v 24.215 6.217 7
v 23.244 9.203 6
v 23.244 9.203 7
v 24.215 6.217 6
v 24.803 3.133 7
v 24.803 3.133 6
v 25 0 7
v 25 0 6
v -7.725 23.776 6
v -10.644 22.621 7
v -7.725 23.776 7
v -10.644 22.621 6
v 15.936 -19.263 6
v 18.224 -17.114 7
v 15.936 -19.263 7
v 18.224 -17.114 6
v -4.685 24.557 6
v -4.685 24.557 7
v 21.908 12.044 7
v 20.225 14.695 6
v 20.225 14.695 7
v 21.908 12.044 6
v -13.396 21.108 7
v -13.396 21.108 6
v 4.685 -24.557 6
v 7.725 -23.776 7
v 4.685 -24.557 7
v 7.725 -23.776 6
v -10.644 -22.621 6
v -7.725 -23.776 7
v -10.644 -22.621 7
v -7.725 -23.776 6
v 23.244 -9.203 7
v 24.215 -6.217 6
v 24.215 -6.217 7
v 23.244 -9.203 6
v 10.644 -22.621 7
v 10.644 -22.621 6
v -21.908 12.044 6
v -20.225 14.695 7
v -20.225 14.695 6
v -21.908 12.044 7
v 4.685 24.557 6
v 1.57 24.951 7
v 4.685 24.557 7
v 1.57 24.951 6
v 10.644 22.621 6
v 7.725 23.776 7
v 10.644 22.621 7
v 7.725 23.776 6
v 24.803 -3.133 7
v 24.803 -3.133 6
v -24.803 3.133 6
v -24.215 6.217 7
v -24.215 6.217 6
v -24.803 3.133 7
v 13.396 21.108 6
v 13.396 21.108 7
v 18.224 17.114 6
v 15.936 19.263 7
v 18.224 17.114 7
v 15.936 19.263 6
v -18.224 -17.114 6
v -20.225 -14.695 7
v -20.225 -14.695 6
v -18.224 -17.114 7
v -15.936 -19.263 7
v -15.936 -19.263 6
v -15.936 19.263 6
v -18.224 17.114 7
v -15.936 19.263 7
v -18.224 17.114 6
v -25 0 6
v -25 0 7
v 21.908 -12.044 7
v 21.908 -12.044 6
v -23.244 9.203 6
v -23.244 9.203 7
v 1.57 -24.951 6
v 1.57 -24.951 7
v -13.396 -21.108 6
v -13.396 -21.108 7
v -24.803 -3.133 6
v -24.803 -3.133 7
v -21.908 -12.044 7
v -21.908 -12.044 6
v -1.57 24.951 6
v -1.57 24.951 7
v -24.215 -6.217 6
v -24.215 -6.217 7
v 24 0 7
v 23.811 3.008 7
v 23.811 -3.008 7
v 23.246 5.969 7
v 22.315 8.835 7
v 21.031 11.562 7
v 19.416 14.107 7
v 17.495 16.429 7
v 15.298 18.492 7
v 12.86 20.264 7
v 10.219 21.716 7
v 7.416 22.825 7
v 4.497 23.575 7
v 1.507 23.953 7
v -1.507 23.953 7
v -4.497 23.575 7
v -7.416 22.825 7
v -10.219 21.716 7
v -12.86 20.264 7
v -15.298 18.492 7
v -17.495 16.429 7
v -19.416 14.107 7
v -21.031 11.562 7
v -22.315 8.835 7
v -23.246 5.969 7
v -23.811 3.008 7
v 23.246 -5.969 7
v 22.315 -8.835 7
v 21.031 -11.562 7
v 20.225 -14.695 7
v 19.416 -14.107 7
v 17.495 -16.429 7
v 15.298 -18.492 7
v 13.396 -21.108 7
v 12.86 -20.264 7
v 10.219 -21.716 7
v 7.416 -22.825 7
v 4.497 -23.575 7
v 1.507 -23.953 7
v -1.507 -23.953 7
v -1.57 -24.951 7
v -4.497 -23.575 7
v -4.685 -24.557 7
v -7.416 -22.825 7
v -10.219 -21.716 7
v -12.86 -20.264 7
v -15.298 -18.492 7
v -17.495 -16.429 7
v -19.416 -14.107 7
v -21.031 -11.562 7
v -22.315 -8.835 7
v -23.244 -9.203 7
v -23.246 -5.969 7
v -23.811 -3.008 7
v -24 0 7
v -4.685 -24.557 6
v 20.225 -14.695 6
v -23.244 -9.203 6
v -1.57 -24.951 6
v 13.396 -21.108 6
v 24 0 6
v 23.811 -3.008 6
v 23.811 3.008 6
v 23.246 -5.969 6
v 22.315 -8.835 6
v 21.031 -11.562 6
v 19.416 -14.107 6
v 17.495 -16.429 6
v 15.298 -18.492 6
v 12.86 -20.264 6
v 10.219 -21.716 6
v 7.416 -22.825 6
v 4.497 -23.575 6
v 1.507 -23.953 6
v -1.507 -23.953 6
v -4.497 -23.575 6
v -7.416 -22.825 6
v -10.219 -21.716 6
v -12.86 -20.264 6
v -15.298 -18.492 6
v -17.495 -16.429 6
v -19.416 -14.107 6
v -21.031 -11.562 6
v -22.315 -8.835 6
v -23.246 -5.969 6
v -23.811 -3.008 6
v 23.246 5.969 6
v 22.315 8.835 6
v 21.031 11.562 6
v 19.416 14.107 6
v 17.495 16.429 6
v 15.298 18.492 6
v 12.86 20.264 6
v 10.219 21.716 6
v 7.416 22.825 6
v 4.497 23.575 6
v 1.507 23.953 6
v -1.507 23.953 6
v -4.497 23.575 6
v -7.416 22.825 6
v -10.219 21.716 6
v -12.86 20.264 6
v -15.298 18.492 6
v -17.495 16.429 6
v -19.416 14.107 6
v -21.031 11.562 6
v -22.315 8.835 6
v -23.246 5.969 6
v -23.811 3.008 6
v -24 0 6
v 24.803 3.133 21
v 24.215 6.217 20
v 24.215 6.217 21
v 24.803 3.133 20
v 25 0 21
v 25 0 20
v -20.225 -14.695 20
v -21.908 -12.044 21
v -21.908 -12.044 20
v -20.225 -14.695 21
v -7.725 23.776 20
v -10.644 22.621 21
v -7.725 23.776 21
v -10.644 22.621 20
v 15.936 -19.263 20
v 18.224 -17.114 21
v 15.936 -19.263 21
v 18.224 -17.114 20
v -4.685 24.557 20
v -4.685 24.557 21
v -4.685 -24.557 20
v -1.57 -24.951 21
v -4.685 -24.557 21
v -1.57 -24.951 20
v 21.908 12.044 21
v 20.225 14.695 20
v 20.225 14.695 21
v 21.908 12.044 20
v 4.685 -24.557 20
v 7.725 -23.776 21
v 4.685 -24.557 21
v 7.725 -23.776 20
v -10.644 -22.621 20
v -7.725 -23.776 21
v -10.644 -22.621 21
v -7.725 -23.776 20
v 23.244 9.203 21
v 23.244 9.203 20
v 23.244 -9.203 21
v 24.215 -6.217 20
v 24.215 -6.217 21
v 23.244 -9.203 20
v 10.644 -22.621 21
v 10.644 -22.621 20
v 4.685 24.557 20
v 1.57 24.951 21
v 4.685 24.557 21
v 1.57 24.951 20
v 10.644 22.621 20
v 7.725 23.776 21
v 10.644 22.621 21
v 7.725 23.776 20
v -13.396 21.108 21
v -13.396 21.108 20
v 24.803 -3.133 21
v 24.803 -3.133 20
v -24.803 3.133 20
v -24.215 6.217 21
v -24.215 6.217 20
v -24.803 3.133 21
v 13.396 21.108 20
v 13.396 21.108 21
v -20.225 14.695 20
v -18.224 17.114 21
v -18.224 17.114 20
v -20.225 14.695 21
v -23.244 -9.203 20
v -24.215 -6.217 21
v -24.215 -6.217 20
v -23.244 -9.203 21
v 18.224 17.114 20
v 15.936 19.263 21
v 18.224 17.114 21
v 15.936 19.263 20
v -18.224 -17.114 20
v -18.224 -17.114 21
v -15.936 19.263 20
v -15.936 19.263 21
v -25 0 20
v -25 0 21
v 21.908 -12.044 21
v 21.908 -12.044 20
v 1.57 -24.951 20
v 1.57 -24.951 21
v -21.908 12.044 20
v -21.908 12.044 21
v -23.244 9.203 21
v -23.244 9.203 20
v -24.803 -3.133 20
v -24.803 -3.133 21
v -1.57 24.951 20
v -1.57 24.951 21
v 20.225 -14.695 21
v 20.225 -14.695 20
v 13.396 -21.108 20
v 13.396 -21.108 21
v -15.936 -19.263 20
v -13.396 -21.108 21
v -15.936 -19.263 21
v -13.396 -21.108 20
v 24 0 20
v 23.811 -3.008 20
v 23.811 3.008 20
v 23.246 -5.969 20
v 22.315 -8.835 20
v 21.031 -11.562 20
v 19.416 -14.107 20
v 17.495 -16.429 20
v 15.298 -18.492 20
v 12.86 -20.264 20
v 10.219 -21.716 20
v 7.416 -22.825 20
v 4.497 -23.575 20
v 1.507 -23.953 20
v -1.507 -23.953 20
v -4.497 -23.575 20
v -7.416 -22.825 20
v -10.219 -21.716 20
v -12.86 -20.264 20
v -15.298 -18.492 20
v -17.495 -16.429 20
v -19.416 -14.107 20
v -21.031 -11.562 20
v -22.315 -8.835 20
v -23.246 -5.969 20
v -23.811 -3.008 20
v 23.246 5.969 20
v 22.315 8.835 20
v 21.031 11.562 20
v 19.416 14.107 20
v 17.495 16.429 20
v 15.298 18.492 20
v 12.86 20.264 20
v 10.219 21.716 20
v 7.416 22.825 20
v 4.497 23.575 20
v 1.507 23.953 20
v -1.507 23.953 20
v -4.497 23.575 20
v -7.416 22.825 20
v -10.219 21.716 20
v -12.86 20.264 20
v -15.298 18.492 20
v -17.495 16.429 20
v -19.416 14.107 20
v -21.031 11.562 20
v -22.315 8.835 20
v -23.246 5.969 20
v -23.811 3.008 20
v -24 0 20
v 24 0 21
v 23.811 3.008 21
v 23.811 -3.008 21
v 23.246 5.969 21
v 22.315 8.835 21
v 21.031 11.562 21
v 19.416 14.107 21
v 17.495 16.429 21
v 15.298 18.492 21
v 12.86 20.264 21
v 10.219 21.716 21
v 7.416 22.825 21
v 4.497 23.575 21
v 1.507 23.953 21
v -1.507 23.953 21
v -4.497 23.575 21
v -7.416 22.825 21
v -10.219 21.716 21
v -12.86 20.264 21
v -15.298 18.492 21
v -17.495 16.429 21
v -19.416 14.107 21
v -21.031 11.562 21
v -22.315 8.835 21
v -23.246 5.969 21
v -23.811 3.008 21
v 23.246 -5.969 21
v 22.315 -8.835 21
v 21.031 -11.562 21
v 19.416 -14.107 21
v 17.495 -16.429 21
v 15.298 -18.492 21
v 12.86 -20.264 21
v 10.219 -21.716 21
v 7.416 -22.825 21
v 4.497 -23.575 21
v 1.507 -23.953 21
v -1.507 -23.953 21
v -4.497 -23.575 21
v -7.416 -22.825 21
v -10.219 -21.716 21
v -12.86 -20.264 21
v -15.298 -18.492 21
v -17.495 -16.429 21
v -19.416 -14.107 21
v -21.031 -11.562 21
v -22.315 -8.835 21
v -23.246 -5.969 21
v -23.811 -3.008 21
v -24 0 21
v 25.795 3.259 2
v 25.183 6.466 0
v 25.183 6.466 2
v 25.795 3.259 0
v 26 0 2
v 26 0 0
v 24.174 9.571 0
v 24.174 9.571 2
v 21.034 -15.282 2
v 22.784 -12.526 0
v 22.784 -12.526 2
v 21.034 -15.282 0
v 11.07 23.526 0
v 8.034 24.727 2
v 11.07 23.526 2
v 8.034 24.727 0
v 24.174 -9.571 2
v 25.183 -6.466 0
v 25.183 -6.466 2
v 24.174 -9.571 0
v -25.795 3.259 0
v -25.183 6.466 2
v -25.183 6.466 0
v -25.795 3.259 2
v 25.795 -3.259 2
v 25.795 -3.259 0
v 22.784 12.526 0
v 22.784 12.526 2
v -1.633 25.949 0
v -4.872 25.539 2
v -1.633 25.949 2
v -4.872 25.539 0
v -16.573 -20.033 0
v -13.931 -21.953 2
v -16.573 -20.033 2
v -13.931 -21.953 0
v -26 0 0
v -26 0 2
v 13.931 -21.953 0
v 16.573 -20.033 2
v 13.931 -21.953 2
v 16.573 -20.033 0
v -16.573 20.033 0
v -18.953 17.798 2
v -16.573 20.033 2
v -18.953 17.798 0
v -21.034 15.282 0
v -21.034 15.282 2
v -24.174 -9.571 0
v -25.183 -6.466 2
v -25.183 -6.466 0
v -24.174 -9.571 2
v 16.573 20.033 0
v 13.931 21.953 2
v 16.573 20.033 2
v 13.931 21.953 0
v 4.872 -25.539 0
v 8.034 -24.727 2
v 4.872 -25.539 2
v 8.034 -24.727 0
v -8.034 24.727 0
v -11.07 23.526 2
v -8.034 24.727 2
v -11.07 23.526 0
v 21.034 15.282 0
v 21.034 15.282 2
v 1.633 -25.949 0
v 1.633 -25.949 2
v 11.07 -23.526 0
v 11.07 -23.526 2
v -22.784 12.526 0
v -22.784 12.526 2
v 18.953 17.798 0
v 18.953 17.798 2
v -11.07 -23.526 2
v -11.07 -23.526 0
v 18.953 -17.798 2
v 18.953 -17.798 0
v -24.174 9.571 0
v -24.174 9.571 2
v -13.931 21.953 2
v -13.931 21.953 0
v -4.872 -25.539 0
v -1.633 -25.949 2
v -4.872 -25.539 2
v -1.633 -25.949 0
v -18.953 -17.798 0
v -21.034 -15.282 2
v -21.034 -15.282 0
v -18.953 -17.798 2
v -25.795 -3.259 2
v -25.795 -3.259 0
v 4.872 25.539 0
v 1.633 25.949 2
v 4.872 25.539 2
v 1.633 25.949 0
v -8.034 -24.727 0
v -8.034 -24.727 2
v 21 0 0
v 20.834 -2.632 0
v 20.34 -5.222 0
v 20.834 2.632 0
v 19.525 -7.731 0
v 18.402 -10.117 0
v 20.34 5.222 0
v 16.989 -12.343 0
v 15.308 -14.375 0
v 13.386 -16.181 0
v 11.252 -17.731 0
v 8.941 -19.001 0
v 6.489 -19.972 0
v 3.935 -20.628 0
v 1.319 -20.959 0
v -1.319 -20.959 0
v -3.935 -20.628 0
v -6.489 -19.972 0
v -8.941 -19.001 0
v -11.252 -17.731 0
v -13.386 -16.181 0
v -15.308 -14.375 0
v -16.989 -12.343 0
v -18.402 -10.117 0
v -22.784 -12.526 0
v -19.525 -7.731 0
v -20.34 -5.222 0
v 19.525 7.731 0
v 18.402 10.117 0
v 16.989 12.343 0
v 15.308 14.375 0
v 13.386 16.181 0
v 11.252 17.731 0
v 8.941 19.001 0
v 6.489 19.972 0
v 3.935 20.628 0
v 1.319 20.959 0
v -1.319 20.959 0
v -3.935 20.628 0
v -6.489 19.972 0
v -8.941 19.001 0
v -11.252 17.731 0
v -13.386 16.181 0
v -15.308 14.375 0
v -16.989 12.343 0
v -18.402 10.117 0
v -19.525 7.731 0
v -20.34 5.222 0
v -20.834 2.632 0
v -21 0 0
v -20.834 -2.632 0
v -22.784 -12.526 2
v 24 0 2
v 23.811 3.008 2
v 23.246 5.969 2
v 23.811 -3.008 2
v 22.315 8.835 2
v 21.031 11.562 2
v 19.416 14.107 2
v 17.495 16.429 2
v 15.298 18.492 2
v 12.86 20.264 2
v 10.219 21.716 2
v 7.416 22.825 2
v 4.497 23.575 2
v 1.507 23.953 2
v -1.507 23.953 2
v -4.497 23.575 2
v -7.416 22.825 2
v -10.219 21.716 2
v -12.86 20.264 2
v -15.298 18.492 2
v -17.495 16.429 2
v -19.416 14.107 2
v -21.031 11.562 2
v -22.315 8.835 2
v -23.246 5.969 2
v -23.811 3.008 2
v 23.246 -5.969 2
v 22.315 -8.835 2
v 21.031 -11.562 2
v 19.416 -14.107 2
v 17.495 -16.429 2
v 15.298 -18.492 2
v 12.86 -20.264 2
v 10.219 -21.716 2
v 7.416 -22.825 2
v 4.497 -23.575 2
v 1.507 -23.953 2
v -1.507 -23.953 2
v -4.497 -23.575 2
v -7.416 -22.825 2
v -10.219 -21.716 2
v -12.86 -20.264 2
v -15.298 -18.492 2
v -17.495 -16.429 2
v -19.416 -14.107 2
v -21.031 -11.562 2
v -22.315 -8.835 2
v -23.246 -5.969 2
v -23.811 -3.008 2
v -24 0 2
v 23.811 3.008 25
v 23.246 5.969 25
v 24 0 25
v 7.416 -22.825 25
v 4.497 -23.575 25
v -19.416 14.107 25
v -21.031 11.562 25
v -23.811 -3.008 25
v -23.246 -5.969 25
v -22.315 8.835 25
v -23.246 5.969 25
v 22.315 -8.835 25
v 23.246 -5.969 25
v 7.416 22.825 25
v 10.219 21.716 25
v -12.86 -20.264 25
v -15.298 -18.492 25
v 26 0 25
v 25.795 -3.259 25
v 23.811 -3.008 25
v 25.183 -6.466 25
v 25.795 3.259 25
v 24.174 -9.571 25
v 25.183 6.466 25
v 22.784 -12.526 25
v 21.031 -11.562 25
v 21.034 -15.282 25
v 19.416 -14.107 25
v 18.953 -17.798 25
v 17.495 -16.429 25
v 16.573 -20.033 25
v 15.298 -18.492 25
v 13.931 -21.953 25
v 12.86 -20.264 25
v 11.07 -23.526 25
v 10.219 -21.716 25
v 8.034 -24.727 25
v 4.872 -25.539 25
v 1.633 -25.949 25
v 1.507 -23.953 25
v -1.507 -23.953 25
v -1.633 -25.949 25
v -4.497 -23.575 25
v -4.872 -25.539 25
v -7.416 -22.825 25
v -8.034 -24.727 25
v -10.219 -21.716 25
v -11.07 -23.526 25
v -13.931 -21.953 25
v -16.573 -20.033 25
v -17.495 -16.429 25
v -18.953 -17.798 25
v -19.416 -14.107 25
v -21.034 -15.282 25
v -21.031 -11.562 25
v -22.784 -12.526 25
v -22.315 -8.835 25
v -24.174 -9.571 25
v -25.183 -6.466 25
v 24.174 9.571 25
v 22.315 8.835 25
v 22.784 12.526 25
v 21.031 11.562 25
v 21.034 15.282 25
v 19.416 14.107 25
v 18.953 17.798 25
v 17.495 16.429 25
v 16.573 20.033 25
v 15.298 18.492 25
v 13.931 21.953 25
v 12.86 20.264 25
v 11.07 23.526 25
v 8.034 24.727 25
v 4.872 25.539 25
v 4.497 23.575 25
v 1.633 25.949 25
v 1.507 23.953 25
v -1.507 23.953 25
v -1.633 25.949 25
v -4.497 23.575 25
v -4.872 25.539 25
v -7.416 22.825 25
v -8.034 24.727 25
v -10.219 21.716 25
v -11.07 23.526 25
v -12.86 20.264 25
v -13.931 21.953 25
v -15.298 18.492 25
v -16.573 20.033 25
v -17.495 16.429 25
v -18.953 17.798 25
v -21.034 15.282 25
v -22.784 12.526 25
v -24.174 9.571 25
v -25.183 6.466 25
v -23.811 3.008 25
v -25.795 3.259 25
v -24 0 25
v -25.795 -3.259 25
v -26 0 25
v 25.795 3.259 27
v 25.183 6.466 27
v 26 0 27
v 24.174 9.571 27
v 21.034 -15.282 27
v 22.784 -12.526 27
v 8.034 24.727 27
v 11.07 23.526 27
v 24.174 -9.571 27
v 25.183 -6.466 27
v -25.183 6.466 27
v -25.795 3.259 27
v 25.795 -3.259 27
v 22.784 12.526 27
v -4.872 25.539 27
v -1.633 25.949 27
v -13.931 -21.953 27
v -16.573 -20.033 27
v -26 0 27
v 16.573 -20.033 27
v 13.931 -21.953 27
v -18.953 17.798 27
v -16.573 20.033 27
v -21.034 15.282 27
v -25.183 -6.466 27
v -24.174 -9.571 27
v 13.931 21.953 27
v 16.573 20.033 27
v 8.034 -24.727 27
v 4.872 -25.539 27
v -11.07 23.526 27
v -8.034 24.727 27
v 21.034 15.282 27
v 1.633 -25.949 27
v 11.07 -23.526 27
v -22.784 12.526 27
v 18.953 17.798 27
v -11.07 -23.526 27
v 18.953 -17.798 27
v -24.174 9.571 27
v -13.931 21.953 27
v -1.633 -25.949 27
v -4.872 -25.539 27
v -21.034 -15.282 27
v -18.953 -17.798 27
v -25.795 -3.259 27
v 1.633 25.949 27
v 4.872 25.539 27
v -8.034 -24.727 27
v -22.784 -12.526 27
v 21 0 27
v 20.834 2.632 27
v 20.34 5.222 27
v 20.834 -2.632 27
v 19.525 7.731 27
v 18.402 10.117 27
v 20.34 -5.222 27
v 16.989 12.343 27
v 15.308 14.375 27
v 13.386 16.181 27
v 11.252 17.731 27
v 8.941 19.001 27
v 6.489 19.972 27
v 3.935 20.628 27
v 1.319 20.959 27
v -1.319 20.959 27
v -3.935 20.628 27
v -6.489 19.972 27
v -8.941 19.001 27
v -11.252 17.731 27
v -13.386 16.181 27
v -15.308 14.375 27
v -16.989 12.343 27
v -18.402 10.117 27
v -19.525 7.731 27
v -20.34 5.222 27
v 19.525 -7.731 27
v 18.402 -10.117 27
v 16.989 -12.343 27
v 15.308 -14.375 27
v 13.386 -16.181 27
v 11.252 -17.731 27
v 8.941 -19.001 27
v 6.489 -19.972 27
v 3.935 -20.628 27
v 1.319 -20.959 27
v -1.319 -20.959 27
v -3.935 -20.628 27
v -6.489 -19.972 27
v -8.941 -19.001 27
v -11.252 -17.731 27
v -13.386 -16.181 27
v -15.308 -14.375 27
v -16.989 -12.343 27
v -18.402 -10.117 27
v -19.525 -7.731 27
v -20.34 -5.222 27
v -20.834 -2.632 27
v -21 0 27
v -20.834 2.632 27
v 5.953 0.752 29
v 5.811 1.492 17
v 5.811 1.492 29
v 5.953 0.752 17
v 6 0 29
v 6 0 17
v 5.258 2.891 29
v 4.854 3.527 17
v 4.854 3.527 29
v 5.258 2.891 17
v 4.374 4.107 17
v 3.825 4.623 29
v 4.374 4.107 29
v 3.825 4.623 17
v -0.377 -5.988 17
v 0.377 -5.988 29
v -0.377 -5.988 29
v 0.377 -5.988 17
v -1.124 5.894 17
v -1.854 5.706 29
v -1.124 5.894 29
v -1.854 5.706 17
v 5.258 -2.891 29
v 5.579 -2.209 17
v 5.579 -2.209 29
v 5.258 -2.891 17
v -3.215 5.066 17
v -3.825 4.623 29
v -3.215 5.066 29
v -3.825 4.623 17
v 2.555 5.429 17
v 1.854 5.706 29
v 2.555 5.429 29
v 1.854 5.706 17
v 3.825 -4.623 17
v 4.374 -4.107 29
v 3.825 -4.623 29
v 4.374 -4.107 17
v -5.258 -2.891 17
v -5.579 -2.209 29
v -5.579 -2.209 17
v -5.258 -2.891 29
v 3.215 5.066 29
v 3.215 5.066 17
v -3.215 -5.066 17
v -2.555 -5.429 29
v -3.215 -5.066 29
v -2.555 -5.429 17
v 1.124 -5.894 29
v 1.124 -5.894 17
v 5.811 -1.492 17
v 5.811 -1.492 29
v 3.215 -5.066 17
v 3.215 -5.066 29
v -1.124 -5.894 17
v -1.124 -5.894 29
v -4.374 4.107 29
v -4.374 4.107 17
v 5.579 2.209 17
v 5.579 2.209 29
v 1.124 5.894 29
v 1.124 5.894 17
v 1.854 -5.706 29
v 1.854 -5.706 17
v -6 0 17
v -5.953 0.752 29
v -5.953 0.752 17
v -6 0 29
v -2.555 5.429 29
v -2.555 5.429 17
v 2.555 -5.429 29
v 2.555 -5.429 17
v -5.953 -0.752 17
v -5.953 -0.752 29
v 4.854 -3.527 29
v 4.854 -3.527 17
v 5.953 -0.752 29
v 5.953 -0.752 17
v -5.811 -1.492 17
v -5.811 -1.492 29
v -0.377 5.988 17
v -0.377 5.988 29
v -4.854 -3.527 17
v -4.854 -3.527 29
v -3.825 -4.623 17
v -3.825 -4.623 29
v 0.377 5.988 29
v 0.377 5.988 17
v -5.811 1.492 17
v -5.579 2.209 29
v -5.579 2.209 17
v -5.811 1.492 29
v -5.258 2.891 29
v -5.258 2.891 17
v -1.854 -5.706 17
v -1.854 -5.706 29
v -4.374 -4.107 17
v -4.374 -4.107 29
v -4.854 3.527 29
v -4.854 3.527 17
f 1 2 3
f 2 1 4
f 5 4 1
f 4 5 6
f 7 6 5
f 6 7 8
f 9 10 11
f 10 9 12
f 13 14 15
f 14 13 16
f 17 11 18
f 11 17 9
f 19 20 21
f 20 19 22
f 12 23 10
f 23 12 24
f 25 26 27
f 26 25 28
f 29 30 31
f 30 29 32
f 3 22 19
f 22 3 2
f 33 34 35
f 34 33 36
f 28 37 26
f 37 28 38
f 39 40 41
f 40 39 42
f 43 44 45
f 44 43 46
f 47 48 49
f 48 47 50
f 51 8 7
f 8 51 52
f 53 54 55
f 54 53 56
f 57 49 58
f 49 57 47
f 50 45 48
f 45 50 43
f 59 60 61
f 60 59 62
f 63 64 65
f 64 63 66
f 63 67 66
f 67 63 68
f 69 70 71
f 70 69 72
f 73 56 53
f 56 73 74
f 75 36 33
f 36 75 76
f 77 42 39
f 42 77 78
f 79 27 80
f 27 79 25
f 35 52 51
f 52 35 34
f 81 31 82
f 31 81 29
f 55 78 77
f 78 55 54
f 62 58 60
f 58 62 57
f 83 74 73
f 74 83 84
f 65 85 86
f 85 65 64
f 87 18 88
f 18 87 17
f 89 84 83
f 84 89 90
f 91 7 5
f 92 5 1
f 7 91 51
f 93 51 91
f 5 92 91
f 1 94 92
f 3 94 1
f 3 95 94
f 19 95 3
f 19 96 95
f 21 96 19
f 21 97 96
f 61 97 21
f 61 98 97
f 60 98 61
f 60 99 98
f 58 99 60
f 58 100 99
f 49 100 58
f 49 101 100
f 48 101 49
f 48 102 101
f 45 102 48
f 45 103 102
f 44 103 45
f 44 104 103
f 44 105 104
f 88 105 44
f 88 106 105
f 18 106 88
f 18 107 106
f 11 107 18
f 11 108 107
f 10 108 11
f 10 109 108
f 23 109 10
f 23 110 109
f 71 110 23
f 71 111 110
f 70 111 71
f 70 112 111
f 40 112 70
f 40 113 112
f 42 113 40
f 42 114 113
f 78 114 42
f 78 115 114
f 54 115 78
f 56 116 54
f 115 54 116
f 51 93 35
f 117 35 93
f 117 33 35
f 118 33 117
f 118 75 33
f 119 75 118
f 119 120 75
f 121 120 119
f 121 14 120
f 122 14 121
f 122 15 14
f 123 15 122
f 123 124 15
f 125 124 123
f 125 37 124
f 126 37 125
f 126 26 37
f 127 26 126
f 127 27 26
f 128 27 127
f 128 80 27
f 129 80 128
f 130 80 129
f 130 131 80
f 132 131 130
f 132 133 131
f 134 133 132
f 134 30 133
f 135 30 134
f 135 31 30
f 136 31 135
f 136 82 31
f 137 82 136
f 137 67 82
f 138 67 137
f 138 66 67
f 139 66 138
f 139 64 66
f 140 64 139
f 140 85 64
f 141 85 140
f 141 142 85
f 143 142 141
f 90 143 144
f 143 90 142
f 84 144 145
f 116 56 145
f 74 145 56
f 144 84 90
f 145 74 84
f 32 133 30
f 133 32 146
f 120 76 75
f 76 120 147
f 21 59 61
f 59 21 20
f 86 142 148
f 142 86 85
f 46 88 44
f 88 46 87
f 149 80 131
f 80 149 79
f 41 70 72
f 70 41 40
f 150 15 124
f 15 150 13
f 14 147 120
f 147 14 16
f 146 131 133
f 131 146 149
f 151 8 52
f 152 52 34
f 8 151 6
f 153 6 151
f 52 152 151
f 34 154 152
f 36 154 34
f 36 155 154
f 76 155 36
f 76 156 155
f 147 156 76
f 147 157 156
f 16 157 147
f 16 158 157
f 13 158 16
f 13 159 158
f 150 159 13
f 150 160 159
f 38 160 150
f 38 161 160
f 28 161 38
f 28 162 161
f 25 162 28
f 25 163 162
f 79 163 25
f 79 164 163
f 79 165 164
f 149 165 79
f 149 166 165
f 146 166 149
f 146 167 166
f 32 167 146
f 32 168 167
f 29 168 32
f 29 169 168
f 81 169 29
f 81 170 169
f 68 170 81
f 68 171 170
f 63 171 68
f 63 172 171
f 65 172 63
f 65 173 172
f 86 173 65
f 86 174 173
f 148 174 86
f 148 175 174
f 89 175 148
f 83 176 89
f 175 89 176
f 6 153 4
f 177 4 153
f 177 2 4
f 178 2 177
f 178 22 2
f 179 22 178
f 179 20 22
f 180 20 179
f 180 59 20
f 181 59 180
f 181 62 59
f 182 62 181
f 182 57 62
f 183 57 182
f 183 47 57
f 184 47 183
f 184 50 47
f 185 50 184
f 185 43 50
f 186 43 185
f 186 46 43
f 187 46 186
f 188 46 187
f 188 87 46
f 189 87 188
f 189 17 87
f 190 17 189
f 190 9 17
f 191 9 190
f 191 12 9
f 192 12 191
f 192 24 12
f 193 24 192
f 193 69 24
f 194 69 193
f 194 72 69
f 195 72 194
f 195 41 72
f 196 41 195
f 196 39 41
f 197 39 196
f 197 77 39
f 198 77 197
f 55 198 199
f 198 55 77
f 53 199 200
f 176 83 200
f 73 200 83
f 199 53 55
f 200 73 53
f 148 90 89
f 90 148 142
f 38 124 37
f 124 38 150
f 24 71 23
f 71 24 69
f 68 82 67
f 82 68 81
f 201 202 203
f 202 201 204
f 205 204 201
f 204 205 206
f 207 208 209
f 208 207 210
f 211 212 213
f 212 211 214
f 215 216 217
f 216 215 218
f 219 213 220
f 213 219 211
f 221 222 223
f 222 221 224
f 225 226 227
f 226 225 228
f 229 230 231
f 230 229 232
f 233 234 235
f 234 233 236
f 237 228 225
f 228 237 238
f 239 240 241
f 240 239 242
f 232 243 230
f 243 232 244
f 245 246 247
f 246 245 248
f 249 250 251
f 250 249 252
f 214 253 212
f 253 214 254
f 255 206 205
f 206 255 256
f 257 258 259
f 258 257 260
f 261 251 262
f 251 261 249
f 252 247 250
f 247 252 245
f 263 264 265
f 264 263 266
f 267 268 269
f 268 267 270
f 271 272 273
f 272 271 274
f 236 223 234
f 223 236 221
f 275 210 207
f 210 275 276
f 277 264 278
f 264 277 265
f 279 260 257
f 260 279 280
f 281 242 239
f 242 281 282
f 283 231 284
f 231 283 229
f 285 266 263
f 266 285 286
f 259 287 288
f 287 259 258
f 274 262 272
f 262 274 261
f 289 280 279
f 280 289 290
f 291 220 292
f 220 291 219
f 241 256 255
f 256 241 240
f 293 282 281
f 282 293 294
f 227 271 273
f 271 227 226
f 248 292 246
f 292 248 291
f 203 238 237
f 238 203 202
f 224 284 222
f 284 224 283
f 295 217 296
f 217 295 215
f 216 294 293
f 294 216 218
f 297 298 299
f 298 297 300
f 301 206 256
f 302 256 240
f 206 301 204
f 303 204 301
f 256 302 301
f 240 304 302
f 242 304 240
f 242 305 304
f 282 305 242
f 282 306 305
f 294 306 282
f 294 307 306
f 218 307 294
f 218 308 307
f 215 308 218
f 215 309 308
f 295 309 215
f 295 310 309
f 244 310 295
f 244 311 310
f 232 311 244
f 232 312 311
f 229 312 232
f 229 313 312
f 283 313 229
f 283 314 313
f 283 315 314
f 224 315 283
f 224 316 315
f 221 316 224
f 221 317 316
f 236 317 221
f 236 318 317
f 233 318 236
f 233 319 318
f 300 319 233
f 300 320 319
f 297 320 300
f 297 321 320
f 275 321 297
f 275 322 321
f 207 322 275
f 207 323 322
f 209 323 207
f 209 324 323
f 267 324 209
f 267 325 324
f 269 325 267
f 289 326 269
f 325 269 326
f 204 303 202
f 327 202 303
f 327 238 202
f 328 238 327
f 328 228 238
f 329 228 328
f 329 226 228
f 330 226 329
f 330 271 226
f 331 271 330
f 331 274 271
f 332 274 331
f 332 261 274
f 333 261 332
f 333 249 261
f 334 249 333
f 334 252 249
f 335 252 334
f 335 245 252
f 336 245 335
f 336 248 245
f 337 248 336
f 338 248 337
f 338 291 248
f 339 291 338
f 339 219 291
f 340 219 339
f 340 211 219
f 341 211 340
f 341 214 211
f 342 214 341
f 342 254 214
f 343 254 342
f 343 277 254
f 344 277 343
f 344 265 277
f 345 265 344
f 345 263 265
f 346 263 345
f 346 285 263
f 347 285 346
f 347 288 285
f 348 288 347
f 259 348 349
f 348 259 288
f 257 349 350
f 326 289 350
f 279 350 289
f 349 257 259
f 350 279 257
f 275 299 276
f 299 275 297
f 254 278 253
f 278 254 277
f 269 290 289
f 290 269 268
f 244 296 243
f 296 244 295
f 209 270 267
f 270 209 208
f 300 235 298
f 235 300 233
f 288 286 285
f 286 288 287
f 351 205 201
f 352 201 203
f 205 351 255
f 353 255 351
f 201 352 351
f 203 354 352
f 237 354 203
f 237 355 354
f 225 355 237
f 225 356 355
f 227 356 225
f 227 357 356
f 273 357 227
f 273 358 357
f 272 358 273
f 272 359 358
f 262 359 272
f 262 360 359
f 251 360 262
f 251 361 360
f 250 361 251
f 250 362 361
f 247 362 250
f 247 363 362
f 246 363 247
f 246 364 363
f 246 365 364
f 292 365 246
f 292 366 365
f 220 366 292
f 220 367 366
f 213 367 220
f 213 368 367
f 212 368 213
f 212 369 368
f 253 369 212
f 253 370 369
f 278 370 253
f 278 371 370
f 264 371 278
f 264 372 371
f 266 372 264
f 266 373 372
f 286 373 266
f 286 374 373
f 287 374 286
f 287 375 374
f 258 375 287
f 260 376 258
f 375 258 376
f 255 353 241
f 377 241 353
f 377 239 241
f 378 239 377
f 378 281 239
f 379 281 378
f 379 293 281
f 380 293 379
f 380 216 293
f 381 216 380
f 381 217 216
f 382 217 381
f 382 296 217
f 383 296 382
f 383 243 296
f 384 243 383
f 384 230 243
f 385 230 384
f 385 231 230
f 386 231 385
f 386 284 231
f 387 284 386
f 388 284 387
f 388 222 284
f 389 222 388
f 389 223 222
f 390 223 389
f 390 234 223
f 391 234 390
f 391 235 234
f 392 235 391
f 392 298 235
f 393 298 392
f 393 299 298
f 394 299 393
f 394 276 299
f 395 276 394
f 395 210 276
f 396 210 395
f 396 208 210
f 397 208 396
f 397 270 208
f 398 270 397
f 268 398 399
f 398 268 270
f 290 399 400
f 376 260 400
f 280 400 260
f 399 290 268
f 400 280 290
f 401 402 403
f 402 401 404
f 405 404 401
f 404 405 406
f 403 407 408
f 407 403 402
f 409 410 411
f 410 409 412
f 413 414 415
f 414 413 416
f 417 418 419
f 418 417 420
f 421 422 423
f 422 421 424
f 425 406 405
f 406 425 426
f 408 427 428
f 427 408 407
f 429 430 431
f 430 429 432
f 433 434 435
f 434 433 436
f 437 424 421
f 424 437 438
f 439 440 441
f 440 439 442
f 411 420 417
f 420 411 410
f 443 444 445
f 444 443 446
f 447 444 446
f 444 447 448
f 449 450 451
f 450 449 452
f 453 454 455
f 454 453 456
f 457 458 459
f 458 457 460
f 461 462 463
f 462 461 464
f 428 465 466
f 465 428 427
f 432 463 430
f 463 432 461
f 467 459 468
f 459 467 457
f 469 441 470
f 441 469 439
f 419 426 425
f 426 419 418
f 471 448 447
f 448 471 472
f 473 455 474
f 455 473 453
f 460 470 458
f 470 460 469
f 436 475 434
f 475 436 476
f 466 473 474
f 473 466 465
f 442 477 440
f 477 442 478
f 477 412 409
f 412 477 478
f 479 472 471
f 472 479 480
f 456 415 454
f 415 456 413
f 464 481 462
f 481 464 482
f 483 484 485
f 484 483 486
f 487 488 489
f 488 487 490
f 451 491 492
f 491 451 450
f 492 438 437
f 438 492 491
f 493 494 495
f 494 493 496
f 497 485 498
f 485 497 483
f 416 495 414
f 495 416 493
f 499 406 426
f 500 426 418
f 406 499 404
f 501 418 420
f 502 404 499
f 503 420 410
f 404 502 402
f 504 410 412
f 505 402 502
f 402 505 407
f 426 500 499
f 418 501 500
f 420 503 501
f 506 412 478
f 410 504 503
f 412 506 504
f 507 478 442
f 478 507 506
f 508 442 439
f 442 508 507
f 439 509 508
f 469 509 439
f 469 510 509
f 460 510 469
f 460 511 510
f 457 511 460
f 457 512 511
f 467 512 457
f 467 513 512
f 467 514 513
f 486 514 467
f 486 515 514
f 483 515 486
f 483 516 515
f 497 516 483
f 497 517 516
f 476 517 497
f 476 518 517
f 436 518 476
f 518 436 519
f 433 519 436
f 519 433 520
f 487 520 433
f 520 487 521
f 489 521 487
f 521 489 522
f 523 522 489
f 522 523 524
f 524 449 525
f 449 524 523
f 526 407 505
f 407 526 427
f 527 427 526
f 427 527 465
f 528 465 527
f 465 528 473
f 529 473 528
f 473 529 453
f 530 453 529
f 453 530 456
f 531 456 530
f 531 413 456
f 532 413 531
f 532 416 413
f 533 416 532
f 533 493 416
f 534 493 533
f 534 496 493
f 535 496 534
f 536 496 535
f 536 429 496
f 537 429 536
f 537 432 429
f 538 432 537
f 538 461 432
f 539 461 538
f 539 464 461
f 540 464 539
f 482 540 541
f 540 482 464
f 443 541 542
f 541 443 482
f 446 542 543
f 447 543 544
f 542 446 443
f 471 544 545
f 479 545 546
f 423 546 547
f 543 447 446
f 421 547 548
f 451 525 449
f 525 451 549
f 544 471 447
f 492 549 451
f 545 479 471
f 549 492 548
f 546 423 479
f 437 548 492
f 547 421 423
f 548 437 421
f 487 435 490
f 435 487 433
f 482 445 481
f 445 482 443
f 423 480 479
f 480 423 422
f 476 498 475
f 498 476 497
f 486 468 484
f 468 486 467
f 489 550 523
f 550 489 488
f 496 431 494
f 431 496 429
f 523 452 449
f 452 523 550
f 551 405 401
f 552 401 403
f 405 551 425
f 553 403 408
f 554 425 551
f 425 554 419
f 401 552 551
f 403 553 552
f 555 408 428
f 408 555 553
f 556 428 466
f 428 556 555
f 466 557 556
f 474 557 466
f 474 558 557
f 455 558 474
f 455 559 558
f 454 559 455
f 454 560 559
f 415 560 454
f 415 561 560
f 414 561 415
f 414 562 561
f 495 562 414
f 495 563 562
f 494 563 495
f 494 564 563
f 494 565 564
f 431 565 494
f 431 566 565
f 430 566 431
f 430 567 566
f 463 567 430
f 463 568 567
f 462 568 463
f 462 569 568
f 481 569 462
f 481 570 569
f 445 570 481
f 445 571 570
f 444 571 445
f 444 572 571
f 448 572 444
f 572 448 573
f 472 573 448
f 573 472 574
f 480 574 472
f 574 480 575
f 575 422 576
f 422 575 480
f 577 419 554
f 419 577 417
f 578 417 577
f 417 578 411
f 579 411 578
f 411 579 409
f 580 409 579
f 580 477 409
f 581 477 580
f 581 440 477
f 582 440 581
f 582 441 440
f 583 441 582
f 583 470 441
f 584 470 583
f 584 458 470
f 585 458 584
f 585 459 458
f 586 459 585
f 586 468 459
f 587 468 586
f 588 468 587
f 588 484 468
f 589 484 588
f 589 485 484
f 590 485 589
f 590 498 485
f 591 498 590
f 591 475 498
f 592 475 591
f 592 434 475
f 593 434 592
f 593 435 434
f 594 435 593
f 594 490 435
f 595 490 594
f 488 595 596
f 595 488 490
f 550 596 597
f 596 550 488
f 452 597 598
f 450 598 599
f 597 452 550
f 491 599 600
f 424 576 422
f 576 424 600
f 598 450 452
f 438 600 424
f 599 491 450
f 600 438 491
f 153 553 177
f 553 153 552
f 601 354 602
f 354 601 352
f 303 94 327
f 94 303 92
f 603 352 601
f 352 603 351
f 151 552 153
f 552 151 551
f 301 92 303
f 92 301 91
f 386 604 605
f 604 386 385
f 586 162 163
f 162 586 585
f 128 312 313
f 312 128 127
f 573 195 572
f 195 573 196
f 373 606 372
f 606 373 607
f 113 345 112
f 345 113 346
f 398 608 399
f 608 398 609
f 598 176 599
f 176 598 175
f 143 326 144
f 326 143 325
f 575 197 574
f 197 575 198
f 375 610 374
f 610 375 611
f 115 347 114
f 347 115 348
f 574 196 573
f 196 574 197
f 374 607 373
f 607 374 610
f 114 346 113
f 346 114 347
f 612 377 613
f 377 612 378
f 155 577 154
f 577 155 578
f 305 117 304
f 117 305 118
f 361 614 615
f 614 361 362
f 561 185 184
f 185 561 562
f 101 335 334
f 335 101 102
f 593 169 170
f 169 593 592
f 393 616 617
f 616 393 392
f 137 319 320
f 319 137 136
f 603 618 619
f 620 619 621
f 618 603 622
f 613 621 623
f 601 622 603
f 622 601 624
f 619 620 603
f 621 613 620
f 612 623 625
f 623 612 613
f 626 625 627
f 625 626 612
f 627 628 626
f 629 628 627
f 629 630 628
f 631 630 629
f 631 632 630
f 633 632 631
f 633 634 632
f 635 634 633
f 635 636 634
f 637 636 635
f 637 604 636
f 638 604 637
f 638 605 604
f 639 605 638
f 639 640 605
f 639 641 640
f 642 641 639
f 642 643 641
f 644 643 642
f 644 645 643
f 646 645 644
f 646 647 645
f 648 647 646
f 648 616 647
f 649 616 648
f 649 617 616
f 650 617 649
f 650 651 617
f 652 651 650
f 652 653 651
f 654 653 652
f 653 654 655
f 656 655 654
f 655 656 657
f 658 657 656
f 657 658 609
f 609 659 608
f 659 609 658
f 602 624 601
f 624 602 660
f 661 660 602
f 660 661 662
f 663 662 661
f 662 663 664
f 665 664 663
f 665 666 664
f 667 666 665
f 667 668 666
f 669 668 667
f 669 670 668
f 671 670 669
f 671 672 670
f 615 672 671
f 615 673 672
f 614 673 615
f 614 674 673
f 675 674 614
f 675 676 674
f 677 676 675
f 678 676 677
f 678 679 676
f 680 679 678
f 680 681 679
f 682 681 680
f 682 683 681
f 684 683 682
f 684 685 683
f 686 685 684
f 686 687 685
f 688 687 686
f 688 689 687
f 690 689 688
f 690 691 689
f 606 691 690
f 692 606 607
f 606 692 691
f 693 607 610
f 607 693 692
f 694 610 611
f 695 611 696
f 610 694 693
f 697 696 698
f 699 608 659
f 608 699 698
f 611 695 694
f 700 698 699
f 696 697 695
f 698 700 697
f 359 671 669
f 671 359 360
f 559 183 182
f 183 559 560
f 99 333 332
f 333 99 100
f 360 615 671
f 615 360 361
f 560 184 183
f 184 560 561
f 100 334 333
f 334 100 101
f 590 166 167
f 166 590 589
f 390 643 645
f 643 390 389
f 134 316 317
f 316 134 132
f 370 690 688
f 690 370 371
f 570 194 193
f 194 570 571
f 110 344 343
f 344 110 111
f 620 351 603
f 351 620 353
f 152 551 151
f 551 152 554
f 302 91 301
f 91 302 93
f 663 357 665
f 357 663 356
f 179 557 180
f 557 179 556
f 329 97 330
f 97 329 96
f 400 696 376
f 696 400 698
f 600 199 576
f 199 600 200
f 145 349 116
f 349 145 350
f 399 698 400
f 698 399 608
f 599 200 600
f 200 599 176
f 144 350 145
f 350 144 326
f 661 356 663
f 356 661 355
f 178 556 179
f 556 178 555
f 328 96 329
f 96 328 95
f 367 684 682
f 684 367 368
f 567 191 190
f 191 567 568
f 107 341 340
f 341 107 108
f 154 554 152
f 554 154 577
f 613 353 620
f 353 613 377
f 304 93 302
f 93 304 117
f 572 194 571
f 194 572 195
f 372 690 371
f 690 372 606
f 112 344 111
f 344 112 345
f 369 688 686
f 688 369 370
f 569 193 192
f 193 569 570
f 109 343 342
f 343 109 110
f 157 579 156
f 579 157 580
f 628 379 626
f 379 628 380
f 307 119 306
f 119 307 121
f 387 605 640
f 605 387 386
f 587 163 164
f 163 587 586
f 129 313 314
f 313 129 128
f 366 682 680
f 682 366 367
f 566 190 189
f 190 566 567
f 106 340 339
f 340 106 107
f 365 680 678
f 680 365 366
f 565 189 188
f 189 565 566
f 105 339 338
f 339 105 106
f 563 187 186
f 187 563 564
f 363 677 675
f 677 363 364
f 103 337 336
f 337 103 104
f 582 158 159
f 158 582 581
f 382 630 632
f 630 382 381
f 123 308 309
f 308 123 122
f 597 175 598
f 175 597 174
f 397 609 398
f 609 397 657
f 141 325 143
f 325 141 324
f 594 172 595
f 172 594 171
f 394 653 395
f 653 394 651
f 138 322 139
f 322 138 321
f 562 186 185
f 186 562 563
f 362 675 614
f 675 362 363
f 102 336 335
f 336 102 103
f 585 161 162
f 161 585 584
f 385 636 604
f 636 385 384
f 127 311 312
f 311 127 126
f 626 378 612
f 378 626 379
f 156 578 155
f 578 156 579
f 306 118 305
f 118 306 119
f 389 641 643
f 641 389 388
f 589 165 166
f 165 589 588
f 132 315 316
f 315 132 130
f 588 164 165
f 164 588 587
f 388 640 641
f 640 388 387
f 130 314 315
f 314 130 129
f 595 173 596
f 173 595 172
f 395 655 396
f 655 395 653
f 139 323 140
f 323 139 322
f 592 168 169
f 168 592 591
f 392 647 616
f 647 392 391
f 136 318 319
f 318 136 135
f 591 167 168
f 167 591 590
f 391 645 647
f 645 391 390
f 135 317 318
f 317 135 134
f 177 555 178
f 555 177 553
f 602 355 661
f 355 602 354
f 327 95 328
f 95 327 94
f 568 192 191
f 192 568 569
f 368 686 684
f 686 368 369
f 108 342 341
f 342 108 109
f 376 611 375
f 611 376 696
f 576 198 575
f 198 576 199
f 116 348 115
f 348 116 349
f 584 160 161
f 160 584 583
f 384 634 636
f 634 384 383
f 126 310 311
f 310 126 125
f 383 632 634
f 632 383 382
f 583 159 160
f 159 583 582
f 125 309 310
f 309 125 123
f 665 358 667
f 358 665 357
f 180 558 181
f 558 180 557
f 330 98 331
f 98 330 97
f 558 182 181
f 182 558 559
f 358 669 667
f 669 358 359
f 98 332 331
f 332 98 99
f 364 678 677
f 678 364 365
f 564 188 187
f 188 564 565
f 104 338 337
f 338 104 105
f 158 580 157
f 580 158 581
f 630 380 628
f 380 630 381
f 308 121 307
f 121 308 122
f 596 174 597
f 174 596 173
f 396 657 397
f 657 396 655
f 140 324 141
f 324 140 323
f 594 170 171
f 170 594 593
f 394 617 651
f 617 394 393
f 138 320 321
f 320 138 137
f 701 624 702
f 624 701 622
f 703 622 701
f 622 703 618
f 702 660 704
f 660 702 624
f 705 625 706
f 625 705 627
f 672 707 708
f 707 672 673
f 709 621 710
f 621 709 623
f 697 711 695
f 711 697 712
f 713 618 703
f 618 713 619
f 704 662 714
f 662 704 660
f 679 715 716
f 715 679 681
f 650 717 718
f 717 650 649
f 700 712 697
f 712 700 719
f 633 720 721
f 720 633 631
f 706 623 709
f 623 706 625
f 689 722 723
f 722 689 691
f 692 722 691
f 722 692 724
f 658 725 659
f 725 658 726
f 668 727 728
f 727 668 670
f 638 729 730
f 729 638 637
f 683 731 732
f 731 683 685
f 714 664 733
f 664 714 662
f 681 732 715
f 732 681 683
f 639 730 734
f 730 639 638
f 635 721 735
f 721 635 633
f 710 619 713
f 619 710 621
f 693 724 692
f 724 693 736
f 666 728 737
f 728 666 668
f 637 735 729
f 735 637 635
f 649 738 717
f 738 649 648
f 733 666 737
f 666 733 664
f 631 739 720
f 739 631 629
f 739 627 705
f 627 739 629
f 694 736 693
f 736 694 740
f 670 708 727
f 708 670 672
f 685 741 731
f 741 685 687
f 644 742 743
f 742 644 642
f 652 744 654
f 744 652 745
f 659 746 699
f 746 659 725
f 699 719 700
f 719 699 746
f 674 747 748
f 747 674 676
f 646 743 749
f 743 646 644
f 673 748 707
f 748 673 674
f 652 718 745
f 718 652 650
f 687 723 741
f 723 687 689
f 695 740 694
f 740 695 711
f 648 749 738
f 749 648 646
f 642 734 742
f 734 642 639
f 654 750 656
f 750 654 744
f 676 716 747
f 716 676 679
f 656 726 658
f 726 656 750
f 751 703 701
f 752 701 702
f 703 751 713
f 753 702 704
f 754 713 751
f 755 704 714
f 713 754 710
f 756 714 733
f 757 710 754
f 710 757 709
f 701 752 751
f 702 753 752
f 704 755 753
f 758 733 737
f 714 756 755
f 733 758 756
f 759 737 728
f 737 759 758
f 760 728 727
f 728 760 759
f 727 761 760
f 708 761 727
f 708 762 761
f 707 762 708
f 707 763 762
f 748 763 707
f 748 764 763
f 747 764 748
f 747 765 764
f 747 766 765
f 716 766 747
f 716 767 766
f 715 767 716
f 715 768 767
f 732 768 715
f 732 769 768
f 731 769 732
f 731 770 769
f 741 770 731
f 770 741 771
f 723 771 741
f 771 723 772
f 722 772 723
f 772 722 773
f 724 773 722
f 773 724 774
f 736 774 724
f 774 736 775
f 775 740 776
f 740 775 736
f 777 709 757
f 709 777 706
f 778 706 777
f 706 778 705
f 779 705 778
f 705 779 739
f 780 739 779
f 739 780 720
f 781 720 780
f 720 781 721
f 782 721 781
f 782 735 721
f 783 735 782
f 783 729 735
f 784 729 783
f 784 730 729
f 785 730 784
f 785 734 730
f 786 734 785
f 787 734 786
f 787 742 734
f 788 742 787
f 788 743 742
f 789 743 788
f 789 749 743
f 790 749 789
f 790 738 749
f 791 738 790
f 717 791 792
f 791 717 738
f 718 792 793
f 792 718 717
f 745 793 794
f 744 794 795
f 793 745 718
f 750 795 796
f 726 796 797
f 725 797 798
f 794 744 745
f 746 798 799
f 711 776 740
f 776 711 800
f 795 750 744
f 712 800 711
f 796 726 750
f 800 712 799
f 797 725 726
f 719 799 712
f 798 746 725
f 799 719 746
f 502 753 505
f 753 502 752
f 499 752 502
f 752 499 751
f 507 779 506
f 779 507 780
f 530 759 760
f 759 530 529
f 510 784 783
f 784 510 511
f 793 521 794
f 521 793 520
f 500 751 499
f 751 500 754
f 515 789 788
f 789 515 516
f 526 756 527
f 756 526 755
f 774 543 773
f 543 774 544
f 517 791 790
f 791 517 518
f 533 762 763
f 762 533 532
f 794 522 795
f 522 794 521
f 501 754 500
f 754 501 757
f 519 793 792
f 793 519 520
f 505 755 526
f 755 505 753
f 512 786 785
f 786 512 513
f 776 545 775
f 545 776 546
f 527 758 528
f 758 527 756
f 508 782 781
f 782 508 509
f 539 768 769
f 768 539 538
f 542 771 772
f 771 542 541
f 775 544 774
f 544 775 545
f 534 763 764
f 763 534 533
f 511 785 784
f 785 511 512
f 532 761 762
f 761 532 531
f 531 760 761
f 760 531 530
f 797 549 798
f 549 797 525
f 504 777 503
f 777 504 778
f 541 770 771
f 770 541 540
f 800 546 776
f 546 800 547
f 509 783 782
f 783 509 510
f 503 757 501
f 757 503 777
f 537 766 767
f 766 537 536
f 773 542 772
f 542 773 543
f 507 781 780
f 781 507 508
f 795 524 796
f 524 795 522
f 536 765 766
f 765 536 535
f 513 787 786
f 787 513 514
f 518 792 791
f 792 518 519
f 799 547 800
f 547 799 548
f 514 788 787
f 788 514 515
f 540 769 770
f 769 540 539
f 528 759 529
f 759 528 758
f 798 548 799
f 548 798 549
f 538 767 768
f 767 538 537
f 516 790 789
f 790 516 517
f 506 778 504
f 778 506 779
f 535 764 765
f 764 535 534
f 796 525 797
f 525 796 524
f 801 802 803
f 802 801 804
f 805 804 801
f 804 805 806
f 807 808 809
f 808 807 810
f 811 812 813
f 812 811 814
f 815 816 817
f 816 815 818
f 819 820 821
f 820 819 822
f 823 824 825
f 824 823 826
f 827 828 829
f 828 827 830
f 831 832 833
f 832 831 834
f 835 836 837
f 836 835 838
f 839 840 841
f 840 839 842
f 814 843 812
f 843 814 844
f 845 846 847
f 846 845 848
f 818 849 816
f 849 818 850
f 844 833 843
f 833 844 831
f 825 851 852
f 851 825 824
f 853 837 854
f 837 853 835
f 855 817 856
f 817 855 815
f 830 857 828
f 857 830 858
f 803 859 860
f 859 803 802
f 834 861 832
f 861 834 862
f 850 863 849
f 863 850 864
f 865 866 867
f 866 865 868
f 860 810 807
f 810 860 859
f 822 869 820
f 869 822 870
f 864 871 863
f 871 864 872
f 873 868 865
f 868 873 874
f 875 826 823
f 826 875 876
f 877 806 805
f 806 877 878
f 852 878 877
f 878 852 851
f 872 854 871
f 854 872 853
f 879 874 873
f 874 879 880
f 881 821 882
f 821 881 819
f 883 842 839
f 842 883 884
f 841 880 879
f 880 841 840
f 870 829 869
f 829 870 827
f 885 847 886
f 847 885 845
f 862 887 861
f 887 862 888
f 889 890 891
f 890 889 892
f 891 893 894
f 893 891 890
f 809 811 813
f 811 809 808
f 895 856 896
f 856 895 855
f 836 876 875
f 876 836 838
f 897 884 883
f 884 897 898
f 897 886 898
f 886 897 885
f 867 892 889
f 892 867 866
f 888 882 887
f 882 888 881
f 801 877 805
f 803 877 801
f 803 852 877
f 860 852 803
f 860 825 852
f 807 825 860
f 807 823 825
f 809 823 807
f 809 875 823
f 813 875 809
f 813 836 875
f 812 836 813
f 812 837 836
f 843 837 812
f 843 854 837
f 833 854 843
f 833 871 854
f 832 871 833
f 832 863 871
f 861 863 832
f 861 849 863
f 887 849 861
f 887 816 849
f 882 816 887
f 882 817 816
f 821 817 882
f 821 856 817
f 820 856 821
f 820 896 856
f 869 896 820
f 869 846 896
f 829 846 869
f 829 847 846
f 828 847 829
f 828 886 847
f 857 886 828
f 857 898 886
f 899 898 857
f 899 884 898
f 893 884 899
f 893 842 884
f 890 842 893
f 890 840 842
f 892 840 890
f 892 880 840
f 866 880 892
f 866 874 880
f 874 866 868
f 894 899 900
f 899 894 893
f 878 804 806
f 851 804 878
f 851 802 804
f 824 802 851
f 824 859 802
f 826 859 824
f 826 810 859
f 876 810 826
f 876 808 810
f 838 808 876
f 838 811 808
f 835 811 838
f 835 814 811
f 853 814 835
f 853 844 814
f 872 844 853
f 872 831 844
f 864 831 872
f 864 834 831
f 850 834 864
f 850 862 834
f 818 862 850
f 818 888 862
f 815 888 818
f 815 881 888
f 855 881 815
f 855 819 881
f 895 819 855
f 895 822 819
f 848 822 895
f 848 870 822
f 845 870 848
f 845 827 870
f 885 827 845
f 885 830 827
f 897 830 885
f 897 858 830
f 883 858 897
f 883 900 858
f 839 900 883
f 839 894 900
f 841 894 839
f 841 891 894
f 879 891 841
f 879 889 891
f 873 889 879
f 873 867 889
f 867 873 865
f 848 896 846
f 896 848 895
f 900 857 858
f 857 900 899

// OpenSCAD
// DP parametric wheel
// May 2019. David Price
//
// parametric wheel for a polebot
// initial design is to fit gearmotor tyres
//
// v0.2,  190704 added tyre retention ribs
// v0.1,  190611 initial design to test fit with tyres
//
// wheel parameters
diameter = 48;
width = 27;
thick = 3;
rim_high = 2;
rim_wide = 2;

// hub parameters
hub_inset = 10;
hub_height = 12;
hub_diameter = 12;
// tyre retention rib, offset from rim if greater than 0
rib_offset = 4;
rib_high = 1;
rib_wide = 1;

// derivations to make code simpler
$fn = 50;
dv_wheel_radius = diameter/2;
dv_rim_radius = dv_wheel_radius + rim_high;
dv_inside_radius = dv_wheel_radius - thick;

dv_hub_radius = hub_diameter/2;

dv_rib_radius = dv_wheel_radius + rib_high;

module wheel()
{
 difference() {
    union() {
        cylinder(r=dv_rim_radius, h=rim_wide);
        translate([0,0,rim_wide])
        cylinder(r=dv_wheel_radius, h=width-(rim_wide*2));
        translate([0,0,(width-rim_wide)])
        cylinder(r=dv_rim_radius, h=rim_wide);
        
        rib();

        }
    
    cylinder(r=dv_wheel_radius - thick, h=width);
    }
}

module rib() {
// if greater than zero add two ribs on the wheel to retain the tyre

if (rib_offset>0)
    {
        echo("rib offset is ", rib_offset);
 
        translate([0,0,rib_offset + rim_wide])
        cylinder(r=dv_rib_radius, h=rib_wide);
        translate([0,0,(width-rim_wide - (rib_offset + rib_wide))])
        cylinder(r=dv_rib_radius, h=rib_wide);
       
    }
}


module hub()
{
    translate([0,0,width-hub_inset])
    cylinder(r=dv_hub_radius, h=hub_height);
}

module spokes()
{
}

wheel();
hub();
